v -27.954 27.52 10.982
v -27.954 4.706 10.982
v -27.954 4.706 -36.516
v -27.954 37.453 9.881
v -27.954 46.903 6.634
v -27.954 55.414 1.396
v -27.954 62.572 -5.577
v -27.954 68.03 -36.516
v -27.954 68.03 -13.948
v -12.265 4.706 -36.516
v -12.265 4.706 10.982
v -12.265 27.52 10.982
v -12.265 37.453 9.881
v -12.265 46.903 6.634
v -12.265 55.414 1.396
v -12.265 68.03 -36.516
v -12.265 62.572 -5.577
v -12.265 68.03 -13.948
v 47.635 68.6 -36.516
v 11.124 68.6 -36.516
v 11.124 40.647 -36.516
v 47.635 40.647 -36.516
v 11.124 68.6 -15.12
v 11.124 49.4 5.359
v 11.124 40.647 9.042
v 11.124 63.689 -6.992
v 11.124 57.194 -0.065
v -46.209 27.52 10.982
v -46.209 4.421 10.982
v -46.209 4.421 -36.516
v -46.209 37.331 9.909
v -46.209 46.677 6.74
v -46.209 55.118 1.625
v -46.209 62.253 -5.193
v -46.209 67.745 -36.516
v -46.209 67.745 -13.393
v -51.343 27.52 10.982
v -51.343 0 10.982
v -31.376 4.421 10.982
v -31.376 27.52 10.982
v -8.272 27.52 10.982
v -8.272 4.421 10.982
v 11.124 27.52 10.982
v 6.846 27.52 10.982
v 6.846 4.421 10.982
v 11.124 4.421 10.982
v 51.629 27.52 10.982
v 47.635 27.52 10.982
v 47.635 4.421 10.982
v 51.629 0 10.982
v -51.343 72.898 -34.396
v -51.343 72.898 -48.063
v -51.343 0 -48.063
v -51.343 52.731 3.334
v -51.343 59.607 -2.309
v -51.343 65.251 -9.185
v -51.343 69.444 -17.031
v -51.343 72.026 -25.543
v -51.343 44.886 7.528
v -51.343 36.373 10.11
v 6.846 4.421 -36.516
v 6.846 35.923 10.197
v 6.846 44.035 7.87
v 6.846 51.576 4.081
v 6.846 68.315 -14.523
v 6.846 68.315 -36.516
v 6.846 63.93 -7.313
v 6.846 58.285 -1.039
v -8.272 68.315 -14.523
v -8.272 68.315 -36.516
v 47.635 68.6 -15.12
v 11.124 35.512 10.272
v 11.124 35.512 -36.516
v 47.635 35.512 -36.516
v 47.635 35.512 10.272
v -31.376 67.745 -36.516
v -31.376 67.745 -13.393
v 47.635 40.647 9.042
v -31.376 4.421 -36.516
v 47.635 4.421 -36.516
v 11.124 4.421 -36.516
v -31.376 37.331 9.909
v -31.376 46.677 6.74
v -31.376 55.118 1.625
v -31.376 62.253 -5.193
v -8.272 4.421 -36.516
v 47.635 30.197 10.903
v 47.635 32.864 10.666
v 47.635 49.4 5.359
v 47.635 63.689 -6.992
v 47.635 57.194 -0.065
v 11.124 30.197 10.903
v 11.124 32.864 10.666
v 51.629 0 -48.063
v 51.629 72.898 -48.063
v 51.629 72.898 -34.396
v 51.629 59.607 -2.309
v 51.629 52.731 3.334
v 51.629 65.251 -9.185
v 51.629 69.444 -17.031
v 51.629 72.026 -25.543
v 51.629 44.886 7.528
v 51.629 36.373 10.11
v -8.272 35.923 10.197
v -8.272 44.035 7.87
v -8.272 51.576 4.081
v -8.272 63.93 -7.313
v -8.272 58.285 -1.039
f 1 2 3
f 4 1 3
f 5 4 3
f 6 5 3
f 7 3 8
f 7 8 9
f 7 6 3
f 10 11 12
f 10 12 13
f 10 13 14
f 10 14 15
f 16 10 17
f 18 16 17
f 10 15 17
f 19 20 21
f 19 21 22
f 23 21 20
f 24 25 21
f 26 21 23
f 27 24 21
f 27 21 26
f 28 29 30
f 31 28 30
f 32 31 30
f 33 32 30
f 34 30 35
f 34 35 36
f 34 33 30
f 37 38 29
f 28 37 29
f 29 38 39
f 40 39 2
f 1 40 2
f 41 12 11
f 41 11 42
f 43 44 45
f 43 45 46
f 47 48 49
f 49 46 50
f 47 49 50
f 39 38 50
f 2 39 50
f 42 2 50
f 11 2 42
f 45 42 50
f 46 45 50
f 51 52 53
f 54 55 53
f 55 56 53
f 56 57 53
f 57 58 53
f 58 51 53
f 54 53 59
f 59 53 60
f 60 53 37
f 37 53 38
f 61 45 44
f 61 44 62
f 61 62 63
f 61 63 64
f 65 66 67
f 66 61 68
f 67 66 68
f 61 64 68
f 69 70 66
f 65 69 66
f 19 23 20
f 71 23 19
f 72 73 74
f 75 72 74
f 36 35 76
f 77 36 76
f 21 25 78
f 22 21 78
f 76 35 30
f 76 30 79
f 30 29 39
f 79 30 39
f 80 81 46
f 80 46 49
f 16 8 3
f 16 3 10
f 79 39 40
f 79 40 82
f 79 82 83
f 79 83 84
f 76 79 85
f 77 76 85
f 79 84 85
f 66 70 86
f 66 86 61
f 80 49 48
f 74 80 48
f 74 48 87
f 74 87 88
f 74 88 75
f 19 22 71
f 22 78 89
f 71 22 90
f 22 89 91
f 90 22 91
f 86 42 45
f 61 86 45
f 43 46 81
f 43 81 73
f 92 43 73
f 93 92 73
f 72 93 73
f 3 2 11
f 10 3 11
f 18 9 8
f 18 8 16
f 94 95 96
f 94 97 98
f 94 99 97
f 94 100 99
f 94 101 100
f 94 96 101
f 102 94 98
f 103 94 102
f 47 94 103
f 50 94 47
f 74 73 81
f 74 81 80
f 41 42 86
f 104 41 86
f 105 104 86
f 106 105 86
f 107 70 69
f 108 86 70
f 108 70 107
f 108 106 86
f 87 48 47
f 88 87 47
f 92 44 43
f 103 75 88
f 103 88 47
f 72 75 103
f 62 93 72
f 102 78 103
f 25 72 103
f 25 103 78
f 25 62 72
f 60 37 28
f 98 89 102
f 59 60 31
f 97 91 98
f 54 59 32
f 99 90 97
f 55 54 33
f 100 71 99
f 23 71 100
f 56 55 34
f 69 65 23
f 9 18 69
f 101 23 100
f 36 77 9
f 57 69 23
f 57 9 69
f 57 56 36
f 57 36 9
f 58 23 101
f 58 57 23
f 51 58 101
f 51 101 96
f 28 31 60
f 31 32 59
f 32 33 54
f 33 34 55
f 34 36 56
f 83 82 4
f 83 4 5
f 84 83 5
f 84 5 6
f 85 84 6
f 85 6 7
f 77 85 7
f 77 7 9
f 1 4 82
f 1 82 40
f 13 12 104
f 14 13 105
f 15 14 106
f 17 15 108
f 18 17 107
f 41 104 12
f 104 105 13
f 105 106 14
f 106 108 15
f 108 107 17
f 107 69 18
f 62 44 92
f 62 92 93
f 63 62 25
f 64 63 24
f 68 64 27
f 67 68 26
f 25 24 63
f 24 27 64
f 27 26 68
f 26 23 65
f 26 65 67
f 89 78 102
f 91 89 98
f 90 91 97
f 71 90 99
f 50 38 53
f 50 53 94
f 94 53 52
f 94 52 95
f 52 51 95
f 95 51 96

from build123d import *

# Parameters (mm, degrees)
F0_W        = 102.9718667269
F0_H        = 59.044812806
F1_DEPTH    = 72.898
F2_W        = 14.8325152695
F2_H        = 63.3234274574
F2_W_2      = 15.6882368028
F2_H_2      = 63.3234172128
F2_W_3      = 15.1177551597
F2_H_3      = 63.8939035125
F2_W_4      = 36.5108018741
F2_H_4      = 27.9535762966
F2_H_5      = 31.0912323184
F4_DEPTH    = 47.498
F5_T1_DEPTH = 329.8596573187


# Not quite as in the source:
# - a fillet or chamfer that OpenCascade refuses, or shapes differently, is made with other operations: its cross-section is extruded or revolved along the edge and cut away or added


with BuildPart() as f1:
    # F0 (on Front) → F1 (new body)
    with BuildSketch(Plane.XZ):
        with Locations((0.1426190138, -18.5406408273)):
            Rectangle(F0_W, F0_H)
    extrude(amount=-F1_DEPTH)

    # F2 (on face) → F4 (cut)
    with BuildSketch(Plane.XY.offset(10.9817655757)):
        with Locations((-38.7927275151, 36.0829436686)):
            Rectangle(F2_W, F2_H)
        with Locations((-20.1094653457, 36.3681793679)):
            Rectangle(F2_W_2, F2_H_2)
        with Locations((-0.7131015882, 36.3681816962)):
            Rectangle(F2_W_3, F2_H_3)
        with Locations((29.3797855265, 54.6235833317)):
            Rectangle(F2_W_4, F2_H_4)
        with Locations((29.3797855265, 19.9668460991)):
            Rectangle(F2_W_4, F2_H_5)
    extrude(amount=-F4_DEPTH, mode=Mode.SUBTRACT)

    # F5: fillet of radius 45.3775581184 on 1 edges, made by hand

    # F5_s2 → F5_t1 (cut)
    with BuildSketch(Plane.YZ.offset(-164.7872096456)):
        with BuildLine():
            ThreePointArc((27.5204418816, 10.9817655757), (59.6072209408, -2.3090134835), (72.898, -34.3957925427))
            Line((72.898, -34.3957925427), (72.898, 10.9817655757))
            Line((72.898, 10.9817655757), (27.5204418816, 10.9817655757))
        make_face()
    extrude(amount=F5_T1_DEPTH, mode=Mode.SUBTRACT)


solid = f1.part
